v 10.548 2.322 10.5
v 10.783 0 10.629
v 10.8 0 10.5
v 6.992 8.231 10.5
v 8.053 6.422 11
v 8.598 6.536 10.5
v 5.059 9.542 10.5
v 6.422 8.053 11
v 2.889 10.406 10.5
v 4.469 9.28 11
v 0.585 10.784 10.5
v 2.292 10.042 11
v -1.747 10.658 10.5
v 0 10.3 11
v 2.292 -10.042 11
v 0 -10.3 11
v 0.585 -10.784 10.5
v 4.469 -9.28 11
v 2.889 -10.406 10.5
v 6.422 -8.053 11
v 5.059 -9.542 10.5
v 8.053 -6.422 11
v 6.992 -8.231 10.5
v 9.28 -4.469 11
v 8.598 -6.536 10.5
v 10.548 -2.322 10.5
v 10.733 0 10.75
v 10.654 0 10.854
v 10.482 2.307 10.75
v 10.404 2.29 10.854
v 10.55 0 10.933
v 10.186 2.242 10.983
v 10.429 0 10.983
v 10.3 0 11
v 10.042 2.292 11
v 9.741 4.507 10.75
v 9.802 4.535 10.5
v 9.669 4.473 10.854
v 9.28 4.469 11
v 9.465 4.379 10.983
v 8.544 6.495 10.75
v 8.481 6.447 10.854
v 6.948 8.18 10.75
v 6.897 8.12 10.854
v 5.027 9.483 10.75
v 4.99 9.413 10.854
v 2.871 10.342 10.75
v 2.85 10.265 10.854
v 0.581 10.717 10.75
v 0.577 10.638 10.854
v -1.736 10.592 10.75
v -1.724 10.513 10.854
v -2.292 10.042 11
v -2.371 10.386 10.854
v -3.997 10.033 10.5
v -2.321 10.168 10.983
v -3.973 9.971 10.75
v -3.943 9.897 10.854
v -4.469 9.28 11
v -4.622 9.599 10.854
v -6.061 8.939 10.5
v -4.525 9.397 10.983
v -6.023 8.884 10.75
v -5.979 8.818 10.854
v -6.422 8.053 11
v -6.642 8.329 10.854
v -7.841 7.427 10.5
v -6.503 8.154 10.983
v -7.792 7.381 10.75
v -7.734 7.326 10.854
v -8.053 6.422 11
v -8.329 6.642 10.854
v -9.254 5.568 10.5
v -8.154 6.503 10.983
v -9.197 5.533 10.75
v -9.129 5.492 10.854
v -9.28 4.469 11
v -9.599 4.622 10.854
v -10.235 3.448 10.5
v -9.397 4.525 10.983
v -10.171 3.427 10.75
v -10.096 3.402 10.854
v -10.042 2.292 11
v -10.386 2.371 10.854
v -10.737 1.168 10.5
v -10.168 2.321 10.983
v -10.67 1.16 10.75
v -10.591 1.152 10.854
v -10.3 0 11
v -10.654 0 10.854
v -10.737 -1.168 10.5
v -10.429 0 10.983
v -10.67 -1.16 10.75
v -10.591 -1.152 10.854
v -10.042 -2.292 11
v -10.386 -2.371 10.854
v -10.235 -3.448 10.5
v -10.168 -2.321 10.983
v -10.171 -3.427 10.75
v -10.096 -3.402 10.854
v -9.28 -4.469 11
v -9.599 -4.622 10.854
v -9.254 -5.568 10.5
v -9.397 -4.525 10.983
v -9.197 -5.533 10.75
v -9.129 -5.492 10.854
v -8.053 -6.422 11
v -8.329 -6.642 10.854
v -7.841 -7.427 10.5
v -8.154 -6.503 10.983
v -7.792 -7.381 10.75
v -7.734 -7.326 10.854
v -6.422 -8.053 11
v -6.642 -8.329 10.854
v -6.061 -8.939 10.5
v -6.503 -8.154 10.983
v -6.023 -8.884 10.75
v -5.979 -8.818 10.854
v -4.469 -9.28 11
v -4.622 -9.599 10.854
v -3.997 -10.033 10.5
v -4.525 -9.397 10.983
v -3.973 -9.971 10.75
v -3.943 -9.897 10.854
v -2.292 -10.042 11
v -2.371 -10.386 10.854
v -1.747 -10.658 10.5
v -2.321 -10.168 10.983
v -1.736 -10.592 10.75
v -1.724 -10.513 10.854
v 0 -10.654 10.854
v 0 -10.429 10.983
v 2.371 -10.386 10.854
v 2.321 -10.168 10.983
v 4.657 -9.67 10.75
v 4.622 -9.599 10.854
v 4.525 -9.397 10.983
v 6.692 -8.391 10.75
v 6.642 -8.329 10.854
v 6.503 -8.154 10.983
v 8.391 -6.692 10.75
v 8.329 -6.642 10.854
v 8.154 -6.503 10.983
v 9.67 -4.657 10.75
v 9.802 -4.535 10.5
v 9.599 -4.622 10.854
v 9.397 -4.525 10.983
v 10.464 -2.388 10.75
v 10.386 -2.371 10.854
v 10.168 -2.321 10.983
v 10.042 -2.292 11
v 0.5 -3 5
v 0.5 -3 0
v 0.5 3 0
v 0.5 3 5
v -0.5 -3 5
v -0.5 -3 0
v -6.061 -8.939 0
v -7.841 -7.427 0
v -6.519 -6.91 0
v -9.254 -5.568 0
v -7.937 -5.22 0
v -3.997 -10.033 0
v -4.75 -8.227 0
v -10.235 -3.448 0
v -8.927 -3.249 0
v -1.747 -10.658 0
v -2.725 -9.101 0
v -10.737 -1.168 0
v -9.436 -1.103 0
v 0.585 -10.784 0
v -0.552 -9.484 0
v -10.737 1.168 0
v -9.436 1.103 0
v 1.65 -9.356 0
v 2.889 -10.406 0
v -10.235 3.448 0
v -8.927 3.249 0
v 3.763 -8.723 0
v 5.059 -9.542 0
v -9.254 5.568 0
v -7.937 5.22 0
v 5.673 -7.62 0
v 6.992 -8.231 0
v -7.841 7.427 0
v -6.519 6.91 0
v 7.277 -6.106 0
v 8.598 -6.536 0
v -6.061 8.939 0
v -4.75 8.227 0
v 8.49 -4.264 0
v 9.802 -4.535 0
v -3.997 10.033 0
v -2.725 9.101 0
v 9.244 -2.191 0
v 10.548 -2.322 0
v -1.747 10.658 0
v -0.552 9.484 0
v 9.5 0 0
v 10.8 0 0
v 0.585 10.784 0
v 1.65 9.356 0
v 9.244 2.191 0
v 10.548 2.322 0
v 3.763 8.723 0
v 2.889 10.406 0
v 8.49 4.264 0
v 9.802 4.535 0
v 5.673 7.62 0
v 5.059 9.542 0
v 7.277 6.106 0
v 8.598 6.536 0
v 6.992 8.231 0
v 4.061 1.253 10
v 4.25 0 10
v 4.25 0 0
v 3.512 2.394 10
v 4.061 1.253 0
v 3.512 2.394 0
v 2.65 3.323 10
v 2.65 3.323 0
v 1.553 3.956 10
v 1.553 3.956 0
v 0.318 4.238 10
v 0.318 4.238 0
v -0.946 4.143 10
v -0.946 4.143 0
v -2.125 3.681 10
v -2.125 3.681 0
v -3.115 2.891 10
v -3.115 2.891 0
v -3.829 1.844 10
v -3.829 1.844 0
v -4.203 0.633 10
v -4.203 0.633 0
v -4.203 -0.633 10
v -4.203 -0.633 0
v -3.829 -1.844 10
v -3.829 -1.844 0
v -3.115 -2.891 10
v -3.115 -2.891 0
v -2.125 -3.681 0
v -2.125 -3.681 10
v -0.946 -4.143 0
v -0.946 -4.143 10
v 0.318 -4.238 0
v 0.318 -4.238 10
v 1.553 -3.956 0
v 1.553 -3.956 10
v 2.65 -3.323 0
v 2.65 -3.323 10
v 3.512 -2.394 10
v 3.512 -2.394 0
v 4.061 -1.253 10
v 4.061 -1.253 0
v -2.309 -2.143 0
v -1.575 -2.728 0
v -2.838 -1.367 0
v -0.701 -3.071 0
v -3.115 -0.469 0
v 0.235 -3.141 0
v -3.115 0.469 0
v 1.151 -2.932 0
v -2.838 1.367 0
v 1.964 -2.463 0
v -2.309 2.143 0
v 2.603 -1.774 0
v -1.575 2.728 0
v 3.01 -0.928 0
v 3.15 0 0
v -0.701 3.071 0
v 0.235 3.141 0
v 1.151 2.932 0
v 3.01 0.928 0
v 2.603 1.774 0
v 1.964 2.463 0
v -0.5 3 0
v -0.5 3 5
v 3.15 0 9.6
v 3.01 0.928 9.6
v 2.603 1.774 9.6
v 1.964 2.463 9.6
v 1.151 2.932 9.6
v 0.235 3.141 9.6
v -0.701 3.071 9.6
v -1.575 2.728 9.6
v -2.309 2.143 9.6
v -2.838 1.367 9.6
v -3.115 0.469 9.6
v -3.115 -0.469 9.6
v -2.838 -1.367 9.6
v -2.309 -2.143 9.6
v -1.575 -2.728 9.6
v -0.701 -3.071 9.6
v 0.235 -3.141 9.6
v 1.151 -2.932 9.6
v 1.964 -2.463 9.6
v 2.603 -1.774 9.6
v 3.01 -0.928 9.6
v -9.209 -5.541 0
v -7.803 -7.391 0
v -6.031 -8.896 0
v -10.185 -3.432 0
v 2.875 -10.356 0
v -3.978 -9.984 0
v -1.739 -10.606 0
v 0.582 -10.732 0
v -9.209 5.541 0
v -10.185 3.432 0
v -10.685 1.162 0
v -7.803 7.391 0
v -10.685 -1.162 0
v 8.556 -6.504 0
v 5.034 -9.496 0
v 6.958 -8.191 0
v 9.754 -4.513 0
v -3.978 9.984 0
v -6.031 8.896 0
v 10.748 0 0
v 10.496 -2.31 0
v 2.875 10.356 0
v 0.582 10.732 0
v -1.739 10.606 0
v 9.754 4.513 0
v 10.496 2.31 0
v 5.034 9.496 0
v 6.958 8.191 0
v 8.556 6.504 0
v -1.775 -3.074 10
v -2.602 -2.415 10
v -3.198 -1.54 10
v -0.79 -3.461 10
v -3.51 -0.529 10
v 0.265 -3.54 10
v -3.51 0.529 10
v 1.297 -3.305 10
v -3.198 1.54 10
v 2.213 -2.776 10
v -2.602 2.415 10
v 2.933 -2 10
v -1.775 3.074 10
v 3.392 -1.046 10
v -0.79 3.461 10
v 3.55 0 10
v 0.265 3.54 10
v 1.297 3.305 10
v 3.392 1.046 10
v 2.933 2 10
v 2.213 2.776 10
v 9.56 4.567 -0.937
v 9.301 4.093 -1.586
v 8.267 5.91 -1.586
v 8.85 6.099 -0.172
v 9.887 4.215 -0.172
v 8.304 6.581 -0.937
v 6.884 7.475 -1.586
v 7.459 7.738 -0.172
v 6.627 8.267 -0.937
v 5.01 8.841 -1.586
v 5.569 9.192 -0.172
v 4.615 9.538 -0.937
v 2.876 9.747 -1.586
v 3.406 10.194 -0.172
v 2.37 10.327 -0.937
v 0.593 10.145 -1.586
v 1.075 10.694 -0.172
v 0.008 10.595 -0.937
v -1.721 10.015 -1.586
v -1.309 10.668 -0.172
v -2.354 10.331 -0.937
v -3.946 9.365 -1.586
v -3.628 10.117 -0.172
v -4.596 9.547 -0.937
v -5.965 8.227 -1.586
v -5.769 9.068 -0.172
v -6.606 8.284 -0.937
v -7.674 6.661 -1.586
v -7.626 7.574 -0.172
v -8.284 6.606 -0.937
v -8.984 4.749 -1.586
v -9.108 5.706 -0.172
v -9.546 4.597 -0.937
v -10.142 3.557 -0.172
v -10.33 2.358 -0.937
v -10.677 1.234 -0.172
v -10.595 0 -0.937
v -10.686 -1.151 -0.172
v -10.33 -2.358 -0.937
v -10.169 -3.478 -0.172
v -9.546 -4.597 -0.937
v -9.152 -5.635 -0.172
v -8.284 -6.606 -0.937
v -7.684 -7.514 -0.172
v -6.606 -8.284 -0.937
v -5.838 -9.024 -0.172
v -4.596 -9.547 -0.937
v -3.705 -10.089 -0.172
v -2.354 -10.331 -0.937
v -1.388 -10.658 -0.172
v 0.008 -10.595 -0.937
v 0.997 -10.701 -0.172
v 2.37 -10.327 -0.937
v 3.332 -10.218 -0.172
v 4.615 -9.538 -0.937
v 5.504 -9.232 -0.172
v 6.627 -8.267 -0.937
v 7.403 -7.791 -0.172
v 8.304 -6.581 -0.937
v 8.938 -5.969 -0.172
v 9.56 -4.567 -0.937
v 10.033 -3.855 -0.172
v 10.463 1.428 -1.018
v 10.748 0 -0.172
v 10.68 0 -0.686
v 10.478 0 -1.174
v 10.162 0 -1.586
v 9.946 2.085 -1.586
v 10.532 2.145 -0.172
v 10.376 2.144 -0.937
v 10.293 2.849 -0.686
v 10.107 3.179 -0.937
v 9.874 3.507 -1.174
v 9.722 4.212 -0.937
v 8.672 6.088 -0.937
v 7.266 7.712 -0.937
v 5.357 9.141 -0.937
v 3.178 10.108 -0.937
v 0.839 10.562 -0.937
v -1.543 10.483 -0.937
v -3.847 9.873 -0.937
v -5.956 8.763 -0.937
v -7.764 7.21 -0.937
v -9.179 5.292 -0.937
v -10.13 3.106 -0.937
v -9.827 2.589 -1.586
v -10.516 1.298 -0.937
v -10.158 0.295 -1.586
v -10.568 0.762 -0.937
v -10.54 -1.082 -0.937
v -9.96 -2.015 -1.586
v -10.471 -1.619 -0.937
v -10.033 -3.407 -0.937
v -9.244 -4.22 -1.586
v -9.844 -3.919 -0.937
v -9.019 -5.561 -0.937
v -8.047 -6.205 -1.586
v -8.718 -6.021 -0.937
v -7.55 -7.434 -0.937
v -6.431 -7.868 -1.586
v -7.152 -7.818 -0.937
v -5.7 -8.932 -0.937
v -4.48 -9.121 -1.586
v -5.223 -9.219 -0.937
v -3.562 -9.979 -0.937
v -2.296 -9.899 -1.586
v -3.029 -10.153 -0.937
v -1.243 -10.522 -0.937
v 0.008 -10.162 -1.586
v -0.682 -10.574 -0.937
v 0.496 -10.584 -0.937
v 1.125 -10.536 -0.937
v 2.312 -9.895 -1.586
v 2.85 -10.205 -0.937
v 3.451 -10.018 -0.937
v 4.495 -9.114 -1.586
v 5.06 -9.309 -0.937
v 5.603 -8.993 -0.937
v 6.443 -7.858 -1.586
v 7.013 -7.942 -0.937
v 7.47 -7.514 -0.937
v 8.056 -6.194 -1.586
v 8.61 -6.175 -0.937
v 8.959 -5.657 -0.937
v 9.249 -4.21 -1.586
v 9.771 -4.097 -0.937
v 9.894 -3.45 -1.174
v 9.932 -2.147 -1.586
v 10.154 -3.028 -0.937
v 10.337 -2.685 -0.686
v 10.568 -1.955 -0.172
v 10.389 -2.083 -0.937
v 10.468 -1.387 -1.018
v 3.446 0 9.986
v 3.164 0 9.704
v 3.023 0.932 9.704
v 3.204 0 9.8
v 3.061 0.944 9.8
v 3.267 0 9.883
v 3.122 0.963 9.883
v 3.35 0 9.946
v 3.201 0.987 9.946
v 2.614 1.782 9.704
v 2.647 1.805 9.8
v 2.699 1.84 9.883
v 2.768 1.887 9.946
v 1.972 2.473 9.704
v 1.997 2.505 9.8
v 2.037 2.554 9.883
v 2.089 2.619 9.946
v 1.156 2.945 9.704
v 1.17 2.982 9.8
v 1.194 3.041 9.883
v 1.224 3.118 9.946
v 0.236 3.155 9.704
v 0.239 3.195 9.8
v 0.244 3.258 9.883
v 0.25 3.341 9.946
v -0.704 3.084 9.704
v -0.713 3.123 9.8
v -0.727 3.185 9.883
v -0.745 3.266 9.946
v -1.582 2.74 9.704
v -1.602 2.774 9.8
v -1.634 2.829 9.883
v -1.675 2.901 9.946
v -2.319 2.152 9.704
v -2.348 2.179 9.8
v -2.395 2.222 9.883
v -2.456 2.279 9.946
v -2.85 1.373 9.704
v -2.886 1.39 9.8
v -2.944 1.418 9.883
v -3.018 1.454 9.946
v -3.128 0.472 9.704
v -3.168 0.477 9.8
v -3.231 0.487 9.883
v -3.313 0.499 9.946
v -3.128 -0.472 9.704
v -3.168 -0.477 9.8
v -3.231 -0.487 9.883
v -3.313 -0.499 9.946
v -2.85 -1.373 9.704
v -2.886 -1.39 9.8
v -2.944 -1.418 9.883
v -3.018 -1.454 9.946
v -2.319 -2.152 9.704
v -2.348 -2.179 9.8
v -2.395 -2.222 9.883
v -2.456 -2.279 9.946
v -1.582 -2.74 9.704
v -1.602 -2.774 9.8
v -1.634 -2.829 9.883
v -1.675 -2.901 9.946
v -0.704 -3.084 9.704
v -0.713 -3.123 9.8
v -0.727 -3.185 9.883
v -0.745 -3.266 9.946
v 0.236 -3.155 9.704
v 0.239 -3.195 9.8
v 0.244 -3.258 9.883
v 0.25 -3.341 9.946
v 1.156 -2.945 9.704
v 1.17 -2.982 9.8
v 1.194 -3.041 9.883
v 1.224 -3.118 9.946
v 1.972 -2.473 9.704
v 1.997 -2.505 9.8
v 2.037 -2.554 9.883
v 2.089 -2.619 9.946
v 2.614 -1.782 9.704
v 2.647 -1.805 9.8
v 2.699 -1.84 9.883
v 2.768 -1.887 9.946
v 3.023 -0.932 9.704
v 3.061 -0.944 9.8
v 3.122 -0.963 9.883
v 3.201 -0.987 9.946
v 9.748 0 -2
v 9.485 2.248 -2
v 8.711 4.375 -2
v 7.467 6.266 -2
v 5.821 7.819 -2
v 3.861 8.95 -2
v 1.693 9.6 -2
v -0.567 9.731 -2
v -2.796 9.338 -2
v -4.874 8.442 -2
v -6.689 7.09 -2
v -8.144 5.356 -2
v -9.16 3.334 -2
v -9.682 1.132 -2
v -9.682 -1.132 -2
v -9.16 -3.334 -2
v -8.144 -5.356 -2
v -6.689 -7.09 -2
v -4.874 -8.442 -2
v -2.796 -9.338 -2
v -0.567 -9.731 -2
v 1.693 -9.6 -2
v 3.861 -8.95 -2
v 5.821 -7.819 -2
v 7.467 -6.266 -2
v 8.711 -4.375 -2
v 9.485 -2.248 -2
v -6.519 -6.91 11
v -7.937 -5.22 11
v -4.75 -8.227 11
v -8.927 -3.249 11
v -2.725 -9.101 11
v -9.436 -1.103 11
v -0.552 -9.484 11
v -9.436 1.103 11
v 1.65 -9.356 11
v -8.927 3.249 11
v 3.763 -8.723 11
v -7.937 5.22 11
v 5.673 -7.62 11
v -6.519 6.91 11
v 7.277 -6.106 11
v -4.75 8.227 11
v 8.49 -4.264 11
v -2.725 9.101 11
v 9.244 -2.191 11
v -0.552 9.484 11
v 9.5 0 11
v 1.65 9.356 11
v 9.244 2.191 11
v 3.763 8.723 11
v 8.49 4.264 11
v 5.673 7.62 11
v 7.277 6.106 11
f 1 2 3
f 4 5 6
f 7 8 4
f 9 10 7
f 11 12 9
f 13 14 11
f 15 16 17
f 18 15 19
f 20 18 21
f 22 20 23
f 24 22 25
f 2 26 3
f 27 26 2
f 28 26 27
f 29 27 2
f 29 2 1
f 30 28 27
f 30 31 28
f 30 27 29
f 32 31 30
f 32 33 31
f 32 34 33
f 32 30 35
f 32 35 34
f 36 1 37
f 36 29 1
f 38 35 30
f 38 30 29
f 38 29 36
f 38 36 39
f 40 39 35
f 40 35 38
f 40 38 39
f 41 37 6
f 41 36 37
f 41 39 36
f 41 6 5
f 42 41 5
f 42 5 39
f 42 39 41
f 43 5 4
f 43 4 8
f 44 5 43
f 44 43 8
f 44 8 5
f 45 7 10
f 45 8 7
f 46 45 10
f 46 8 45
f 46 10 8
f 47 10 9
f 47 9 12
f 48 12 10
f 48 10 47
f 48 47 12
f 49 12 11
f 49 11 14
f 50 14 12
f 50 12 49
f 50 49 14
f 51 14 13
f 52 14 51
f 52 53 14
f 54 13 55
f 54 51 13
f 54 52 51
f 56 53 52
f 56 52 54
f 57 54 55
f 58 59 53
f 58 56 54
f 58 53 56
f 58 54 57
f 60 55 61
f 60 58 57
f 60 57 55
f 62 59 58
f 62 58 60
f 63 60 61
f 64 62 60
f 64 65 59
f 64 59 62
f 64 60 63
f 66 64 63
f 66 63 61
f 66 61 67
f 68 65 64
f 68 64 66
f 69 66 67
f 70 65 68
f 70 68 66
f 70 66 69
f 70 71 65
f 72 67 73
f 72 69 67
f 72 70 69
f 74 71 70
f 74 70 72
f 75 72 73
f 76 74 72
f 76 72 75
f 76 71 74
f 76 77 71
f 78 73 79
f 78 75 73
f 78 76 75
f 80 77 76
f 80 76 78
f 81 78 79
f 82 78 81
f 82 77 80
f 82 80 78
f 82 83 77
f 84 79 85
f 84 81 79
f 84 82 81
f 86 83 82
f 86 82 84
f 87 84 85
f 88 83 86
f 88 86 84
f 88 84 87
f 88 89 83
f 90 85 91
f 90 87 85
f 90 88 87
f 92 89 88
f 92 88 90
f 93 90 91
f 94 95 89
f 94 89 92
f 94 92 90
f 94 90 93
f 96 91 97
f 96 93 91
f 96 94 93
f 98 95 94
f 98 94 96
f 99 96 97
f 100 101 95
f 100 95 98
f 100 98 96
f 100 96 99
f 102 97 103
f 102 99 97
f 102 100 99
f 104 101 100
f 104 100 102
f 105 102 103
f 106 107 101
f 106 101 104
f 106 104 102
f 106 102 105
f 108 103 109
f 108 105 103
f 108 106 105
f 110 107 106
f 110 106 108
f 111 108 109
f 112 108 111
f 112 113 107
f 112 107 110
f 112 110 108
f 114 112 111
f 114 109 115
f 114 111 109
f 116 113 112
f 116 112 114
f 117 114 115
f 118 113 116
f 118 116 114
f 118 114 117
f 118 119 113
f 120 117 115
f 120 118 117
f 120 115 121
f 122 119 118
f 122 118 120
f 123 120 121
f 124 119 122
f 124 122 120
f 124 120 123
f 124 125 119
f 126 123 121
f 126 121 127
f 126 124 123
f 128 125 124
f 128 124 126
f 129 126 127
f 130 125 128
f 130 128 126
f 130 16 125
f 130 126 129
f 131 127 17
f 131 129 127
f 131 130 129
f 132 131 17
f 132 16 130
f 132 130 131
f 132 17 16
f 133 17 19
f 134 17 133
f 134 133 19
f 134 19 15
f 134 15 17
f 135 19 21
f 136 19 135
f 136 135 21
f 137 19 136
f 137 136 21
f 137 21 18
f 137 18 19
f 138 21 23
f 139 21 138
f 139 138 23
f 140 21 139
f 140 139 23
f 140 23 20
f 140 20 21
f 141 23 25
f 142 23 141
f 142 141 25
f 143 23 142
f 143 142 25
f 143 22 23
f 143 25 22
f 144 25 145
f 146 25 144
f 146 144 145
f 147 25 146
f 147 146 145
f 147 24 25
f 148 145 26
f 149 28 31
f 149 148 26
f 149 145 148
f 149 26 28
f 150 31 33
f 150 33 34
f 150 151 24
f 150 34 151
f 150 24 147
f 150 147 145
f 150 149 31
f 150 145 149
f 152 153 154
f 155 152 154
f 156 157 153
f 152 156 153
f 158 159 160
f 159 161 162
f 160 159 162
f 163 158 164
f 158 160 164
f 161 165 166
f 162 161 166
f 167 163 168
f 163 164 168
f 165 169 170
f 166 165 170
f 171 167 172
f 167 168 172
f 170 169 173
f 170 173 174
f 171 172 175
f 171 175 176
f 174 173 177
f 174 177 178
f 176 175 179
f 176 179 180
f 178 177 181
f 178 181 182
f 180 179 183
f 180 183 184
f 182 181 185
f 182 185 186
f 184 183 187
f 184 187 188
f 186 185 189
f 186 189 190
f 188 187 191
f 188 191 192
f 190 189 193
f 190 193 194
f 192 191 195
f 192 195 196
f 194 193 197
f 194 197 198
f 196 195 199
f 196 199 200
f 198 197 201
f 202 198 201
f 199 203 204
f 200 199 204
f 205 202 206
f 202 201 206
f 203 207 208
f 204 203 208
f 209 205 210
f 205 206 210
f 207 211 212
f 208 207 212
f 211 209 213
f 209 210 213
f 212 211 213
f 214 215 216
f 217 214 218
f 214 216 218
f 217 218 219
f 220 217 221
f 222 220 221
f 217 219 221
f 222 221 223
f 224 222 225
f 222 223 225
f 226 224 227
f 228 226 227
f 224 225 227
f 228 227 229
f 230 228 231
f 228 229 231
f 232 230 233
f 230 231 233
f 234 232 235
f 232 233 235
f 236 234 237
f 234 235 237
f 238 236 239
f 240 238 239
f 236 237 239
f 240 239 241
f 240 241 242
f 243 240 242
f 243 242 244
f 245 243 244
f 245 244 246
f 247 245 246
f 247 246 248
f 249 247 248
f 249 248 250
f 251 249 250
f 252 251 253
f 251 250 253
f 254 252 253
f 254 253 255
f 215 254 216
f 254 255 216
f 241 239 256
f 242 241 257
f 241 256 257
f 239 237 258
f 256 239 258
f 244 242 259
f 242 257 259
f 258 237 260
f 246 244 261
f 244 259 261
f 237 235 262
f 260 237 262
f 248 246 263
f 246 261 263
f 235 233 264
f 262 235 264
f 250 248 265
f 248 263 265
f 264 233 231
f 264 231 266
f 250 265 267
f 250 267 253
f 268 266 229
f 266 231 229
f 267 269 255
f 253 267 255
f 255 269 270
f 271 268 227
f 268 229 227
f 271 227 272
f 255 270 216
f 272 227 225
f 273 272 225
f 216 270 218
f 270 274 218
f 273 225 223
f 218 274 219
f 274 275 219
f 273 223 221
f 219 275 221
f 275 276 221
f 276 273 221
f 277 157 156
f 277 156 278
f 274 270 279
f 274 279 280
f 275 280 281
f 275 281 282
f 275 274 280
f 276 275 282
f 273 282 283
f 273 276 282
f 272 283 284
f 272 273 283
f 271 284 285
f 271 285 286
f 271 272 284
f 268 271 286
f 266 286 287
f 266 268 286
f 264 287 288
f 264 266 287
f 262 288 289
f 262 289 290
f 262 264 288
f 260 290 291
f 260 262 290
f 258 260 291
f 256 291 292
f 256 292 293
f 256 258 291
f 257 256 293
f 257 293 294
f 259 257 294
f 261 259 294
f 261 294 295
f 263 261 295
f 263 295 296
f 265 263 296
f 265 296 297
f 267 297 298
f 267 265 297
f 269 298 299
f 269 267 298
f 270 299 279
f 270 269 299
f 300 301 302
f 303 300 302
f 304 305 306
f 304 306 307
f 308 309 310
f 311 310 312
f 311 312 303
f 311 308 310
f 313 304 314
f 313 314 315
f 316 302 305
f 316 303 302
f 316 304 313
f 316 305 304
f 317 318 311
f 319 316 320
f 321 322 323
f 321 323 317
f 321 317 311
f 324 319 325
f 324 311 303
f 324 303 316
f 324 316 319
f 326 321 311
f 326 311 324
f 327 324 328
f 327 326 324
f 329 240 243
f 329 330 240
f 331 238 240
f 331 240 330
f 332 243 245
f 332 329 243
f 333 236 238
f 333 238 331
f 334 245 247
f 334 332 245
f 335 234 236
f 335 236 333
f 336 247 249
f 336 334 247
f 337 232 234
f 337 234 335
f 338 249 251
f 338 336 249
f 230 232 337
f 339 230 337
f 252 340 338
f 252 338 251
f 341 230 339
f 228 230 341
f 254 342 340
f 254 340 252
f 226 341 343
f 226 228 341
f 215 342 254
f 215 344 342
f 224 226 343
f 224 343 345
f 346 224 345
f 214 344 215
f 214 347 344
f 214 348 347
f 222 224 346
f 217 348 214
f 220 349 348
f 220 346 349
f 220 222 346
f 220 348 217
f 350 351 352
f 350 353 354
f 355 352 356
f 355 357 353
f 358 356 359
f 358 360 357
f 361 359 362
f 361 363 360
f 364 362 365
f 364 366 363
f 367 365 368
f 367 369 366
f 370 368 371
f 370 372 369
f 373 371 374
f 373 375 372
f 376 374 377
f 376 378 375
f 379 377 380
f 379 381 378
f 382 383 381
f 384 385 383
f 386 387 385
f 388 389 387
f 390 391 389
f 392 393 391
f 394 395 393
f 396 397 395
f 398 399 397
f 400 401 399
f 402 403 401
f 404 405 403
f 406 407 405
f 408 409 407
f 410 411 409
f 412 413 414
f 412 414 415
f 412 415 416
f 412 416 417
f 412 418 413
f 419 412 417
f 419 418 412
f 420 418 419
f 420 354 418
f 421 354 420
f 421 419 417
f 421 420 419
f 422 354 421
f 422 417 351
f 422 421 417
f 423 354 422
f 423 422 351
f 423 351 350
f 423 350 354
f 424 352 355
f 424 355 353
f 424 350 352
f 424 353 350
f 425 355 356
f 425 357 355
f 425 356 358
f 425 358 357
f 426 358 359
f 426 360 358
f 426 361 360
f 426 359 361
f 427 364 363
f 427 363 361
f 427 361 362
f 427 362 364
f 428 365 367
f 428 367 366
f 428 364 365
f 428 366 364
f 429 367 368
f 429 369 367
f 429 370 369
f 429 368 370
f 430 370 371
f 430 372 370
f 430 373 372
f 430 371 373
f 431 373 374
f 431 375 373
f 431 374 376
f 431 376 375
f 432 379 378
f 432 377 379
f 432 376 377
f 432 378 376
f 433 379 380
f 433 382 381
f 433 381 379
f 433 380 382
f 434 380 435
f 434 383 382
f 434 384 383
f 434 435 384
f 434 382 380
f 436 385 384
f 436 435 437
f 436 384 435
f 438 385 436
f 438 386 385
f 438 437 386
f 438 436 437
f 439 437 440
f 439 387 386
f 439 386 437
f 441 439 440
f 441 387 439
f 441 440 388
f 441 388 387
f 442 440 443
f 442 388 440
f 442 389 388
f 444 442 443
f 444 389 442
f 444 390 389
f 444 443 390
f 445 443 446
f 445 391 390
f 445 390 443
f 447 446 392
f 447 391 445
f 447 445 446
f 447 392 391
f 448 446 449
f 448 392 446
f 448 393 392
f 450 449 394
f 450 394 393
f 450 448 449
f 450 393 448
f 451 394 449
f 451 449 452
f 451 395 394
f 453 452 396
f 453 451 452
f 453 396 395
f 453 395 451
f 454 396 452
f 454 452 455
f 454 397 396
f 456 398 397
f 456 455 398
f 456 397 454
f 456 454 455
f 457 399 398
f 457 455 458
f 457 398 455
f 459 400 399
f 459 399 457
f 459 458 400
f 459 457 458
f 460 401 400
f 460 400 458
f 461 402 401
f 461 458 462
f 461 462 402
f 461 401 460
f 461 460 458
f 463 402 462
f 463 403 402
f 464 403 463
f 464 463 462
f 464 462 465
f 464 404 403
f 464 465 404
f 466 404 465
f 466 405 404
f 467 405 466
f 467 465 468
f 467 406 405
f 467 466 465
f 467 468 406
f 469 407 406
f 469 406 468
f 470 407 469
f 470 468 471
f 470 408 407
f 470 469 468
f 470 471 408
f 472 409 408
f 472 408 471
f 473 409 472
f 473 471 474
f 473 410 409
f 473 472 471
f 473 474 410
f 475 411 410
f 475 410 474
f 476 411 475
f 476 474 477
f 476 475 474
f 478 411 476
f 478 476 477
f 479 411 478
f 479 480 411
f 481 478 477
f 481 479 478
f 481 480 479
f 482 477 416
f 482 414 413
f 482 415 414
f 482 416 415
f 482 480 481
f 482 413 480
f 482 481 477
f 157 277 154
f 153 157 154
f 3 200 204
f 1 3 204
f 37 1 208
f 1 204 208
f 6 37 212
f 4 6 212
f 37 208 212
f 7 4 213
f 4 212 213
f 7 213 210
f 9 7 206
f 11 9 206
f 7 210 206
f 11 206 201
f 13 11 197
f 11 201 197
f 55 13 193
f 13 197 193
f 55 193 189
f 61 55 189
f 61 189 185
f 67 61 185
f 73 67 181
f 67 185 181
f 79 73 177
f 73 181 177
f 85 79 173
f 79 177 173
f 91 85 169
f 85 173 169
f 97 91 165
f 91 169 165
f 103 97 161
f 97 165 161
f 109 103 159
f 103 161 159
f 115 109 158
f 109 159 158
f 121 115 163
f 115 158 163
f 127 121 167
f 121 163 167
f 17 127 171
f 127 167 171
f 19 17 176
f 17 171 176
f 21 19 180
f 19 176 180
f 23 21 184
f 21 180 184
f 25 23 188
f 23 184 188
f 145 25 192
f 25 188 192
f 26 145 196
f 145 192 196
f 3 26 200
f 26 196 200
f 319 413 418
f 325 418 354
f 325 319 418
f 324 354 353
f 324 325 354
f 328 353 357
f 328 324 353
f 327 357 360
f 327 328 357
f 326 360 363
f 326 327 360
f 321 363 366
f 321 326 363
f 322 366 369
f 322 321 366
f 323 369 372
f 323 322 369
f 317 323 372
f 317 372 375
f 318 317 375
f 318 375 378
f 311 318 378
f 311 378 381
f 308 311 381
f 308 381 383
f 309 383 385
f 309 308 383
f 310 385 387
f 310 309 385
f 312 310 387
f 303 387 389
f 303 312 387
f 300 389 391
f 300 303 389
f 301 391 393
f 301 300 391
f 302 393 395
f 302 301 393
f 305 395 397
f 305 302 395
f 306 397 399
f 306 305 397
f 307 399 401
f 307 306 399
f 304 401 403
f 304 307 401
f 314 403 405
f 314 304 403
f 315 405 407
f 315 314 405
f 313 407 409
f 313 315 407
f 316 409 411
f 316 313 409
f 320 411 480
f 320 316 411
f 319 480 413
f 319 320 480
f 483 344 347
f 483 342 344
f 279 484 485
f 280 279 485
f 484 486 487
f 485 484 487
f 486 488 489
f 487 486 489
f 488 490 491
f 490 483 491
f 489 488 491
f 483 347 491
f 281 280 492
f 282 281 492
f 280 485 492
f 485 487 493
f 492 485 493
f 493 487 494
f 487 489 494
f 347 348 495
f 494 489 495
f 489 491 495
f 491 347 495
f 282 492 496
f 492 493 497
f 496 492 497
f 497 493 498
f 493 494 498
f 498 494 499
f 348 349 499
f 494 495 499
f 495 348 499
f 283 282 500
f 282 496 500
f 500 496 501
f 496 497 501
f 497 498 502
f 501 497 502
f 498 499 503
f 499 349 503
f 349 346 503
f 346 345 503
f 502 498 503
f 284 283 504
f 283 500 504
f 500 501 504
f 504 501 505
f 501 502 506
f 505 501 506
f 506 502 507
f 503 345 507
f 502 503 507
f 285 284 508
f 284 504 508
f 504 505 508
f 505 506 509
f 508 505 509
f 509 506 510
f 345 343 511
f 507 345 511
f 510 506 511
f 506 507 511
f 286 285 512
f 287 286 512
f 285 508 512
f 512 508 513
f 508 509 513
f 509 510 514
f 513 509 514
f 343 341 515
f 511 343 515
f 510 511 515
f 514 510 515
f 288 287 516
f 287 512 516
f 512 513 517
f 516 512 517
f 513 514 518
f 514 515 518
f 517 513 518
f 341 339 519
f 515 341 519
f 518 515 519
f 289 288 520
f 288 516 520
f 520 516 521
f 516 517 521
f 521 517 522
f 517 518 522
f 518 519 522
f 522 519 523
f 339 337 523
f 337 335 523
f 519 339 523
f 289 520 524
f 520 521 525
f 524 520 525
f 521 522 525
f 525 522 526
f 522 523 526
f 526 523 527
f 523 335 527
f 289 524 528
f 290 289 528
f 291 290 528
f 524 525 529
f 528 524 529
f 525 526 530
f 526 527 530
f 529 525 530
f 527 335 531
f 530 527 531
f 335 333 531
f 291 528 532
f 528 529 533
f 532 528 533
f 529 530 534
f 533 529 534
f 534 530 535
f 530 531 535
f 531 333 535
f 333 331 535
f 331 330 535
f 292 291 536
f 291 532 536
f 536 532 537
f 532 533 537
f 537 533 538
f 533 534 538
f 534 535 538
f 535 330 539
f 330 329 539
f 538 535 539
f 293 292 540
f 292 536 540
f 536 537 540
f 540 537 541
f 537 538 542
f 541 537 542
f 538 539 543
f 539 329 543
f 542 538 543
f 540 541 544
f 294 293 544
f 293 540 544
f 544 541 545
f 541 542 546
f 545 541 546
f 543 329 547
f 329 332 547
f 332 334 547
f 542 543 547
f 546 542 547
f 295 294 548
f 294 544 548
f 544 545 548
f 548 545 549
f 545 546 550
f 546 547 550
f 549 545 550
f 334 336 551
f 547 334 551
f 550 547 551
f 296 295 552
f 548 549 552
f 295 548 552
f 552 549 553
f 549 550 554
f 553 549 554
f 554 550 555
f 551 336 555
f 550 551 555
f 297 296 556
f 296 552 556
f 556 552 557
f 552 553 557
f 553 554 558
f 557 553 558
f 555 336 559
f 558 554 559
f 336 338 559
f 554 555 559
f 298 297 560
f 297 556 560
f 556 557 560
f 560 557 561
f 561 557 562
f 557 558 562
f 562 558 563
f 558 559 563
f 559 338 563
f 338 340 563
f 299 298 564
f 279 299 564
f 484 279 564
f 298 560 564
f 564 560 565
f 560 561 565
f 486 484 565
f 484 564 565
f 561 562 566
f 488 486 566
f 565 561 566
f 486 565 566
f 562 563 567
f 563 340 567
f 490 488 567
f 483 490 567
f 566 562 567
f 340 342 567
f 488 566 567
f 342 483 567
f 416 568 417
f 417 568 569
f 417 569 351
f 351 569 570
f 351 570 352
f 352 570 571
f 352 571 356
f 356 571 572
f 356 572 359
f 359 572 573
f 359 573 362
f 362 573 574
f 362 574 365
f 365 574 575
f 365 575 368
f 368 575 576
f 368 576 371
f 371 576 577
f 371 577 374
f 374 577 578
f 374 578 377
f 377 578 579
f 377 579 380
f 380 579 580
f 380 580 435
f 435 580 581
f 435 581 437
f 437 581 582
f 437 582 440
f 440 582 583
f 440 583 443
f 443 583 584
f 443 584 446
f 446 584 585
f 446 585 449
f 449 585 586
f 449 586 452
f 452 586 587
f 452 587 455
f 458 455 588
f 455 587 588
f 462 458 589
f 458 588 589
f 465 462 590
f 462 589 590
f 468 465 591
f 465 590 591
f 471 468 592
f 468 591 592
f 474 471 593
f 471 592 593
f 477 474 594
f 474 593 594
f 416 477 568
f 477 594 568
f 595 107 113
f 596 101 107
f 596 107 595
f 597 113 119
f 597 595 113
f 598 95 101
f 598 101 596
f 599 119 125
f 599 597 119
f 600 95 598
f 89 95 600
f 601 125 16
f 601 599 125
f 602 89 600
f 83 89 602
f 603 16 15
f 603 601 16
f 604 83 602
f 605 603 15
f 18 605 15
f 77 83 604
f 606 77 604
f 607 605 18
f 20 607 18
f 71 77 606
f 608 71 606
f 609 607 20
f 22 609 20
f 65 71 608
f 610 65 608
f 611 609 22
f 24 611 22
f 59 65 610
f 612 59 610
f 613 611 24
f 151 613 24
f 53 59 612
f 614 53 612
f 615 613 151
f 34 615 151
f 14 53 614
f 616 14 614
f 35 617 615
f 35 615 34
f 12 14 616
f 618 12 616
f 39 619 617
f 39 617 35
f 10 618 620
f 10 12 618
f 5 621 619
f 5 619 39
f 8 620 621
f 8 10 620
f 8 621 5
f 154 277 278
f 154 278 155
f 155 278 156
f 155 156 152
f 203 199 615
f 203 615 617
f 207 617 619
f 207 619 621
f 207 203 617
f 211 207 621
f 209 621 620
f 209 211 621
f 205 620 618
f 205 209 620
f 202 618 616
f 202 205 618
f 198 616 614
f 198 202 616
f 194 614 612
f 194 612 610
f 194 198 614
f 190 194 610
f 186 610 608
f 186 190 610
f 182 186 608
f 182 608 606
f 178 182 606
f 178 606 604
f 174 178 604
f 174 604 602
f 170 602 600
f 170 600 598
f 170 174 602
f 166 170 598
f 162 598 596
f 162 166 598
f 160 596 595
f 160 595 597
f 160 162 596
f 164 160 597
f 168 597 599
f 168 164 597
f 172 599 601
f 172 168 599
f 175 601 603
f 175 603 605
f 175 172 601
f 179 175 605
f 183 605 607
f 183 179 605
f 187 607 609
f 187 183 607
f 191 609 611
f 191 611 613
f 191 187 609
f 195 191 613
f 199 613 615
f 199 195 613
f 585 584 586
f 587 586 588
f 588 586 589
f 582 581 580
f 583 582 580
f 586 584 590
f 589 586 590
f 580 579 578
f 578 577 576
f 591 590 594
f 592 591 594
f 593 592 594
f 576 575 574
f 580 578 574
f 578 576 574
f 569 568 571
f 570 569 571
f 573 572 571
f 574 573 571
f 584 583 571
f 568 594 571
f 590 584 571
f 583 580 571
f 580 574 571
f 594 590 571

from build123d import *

# Parameters (mm, degrees)
F0_R     = 4.25
F0_R_2   = 3.15
F1_DEPTH = 10
F2_R     = 10.8
F2_R_2   = 9.5
F3_DEPTH = 11
F4_R     = 10.7477033558
F5_DEPTH = 2
F6_W     = 1
F6_H     = 6
F7_DEPTH = 5
F8_SIZE  = 1
F9_R     = 2
F10_R    = 0.5
F11_R    = 0.4


with BuildPart() as f1:
    # F0 (on Top) → F1 (new body)
    with BuildSketch(Plane.XY):
        Circle(F0_R)
        Circle(F0_R_2, mode=Mode.SUBTRACT)
    extrude(amount=F1_DEPTH)

    # F11
    f11_edges = [f1.edges().sort_by_distance(p)[0] for p in [
        (-3.15, 0, 10),
    ]]
    fillet(f11_edges, radius=F11_R)


with BuildPart() as f3:
    # F2 (on Top) → F3 (new body)
    with BuildSketch(Plane.XY):
        Circle(F2_R)
        Circle(F2_R_2, mode=Mode.SUBTRACT)
    extrude(amount=F3_DEPTH)

    # F10
    f10_edges = [f3.edges().sort_by_distance(p)[0] for p in [
        (-10.8, 0, 11),
    ]]
    fillet(f10_edges, radius=F10_R)


with BuildPart() as f5:
    # F4 (on Top) → F5 (new body)
    with BuildSketch(Plane.XY):
        Circle(F4_R)
    extrude(amount=-F5_DEPTH)

    # F8
    f8_edges = [f5.edges().sort_by_distance(p)[0] for p in [
        (-10.747703, 0, -2),
    ]]
    chamfer(f8_edges, length=F8_SIZE)

    # F9
    f9_edges = [f5.edges().sort_by_distance(p)[0] for p in [
        (-10.747703, 0, -1),
    ]]
    fillet(f9_edges, radius=F9_R)


with BuildPart() as f7:
    # F6 (on face) → F7 (new body)
    with BuildSketch(Plane.XY):
        Rectangle(F6_W, F6_H)
    extrude(amount=F7_DEPTH)


solid = Compound([f1.part, f3.part, f5.part, f7.part])
